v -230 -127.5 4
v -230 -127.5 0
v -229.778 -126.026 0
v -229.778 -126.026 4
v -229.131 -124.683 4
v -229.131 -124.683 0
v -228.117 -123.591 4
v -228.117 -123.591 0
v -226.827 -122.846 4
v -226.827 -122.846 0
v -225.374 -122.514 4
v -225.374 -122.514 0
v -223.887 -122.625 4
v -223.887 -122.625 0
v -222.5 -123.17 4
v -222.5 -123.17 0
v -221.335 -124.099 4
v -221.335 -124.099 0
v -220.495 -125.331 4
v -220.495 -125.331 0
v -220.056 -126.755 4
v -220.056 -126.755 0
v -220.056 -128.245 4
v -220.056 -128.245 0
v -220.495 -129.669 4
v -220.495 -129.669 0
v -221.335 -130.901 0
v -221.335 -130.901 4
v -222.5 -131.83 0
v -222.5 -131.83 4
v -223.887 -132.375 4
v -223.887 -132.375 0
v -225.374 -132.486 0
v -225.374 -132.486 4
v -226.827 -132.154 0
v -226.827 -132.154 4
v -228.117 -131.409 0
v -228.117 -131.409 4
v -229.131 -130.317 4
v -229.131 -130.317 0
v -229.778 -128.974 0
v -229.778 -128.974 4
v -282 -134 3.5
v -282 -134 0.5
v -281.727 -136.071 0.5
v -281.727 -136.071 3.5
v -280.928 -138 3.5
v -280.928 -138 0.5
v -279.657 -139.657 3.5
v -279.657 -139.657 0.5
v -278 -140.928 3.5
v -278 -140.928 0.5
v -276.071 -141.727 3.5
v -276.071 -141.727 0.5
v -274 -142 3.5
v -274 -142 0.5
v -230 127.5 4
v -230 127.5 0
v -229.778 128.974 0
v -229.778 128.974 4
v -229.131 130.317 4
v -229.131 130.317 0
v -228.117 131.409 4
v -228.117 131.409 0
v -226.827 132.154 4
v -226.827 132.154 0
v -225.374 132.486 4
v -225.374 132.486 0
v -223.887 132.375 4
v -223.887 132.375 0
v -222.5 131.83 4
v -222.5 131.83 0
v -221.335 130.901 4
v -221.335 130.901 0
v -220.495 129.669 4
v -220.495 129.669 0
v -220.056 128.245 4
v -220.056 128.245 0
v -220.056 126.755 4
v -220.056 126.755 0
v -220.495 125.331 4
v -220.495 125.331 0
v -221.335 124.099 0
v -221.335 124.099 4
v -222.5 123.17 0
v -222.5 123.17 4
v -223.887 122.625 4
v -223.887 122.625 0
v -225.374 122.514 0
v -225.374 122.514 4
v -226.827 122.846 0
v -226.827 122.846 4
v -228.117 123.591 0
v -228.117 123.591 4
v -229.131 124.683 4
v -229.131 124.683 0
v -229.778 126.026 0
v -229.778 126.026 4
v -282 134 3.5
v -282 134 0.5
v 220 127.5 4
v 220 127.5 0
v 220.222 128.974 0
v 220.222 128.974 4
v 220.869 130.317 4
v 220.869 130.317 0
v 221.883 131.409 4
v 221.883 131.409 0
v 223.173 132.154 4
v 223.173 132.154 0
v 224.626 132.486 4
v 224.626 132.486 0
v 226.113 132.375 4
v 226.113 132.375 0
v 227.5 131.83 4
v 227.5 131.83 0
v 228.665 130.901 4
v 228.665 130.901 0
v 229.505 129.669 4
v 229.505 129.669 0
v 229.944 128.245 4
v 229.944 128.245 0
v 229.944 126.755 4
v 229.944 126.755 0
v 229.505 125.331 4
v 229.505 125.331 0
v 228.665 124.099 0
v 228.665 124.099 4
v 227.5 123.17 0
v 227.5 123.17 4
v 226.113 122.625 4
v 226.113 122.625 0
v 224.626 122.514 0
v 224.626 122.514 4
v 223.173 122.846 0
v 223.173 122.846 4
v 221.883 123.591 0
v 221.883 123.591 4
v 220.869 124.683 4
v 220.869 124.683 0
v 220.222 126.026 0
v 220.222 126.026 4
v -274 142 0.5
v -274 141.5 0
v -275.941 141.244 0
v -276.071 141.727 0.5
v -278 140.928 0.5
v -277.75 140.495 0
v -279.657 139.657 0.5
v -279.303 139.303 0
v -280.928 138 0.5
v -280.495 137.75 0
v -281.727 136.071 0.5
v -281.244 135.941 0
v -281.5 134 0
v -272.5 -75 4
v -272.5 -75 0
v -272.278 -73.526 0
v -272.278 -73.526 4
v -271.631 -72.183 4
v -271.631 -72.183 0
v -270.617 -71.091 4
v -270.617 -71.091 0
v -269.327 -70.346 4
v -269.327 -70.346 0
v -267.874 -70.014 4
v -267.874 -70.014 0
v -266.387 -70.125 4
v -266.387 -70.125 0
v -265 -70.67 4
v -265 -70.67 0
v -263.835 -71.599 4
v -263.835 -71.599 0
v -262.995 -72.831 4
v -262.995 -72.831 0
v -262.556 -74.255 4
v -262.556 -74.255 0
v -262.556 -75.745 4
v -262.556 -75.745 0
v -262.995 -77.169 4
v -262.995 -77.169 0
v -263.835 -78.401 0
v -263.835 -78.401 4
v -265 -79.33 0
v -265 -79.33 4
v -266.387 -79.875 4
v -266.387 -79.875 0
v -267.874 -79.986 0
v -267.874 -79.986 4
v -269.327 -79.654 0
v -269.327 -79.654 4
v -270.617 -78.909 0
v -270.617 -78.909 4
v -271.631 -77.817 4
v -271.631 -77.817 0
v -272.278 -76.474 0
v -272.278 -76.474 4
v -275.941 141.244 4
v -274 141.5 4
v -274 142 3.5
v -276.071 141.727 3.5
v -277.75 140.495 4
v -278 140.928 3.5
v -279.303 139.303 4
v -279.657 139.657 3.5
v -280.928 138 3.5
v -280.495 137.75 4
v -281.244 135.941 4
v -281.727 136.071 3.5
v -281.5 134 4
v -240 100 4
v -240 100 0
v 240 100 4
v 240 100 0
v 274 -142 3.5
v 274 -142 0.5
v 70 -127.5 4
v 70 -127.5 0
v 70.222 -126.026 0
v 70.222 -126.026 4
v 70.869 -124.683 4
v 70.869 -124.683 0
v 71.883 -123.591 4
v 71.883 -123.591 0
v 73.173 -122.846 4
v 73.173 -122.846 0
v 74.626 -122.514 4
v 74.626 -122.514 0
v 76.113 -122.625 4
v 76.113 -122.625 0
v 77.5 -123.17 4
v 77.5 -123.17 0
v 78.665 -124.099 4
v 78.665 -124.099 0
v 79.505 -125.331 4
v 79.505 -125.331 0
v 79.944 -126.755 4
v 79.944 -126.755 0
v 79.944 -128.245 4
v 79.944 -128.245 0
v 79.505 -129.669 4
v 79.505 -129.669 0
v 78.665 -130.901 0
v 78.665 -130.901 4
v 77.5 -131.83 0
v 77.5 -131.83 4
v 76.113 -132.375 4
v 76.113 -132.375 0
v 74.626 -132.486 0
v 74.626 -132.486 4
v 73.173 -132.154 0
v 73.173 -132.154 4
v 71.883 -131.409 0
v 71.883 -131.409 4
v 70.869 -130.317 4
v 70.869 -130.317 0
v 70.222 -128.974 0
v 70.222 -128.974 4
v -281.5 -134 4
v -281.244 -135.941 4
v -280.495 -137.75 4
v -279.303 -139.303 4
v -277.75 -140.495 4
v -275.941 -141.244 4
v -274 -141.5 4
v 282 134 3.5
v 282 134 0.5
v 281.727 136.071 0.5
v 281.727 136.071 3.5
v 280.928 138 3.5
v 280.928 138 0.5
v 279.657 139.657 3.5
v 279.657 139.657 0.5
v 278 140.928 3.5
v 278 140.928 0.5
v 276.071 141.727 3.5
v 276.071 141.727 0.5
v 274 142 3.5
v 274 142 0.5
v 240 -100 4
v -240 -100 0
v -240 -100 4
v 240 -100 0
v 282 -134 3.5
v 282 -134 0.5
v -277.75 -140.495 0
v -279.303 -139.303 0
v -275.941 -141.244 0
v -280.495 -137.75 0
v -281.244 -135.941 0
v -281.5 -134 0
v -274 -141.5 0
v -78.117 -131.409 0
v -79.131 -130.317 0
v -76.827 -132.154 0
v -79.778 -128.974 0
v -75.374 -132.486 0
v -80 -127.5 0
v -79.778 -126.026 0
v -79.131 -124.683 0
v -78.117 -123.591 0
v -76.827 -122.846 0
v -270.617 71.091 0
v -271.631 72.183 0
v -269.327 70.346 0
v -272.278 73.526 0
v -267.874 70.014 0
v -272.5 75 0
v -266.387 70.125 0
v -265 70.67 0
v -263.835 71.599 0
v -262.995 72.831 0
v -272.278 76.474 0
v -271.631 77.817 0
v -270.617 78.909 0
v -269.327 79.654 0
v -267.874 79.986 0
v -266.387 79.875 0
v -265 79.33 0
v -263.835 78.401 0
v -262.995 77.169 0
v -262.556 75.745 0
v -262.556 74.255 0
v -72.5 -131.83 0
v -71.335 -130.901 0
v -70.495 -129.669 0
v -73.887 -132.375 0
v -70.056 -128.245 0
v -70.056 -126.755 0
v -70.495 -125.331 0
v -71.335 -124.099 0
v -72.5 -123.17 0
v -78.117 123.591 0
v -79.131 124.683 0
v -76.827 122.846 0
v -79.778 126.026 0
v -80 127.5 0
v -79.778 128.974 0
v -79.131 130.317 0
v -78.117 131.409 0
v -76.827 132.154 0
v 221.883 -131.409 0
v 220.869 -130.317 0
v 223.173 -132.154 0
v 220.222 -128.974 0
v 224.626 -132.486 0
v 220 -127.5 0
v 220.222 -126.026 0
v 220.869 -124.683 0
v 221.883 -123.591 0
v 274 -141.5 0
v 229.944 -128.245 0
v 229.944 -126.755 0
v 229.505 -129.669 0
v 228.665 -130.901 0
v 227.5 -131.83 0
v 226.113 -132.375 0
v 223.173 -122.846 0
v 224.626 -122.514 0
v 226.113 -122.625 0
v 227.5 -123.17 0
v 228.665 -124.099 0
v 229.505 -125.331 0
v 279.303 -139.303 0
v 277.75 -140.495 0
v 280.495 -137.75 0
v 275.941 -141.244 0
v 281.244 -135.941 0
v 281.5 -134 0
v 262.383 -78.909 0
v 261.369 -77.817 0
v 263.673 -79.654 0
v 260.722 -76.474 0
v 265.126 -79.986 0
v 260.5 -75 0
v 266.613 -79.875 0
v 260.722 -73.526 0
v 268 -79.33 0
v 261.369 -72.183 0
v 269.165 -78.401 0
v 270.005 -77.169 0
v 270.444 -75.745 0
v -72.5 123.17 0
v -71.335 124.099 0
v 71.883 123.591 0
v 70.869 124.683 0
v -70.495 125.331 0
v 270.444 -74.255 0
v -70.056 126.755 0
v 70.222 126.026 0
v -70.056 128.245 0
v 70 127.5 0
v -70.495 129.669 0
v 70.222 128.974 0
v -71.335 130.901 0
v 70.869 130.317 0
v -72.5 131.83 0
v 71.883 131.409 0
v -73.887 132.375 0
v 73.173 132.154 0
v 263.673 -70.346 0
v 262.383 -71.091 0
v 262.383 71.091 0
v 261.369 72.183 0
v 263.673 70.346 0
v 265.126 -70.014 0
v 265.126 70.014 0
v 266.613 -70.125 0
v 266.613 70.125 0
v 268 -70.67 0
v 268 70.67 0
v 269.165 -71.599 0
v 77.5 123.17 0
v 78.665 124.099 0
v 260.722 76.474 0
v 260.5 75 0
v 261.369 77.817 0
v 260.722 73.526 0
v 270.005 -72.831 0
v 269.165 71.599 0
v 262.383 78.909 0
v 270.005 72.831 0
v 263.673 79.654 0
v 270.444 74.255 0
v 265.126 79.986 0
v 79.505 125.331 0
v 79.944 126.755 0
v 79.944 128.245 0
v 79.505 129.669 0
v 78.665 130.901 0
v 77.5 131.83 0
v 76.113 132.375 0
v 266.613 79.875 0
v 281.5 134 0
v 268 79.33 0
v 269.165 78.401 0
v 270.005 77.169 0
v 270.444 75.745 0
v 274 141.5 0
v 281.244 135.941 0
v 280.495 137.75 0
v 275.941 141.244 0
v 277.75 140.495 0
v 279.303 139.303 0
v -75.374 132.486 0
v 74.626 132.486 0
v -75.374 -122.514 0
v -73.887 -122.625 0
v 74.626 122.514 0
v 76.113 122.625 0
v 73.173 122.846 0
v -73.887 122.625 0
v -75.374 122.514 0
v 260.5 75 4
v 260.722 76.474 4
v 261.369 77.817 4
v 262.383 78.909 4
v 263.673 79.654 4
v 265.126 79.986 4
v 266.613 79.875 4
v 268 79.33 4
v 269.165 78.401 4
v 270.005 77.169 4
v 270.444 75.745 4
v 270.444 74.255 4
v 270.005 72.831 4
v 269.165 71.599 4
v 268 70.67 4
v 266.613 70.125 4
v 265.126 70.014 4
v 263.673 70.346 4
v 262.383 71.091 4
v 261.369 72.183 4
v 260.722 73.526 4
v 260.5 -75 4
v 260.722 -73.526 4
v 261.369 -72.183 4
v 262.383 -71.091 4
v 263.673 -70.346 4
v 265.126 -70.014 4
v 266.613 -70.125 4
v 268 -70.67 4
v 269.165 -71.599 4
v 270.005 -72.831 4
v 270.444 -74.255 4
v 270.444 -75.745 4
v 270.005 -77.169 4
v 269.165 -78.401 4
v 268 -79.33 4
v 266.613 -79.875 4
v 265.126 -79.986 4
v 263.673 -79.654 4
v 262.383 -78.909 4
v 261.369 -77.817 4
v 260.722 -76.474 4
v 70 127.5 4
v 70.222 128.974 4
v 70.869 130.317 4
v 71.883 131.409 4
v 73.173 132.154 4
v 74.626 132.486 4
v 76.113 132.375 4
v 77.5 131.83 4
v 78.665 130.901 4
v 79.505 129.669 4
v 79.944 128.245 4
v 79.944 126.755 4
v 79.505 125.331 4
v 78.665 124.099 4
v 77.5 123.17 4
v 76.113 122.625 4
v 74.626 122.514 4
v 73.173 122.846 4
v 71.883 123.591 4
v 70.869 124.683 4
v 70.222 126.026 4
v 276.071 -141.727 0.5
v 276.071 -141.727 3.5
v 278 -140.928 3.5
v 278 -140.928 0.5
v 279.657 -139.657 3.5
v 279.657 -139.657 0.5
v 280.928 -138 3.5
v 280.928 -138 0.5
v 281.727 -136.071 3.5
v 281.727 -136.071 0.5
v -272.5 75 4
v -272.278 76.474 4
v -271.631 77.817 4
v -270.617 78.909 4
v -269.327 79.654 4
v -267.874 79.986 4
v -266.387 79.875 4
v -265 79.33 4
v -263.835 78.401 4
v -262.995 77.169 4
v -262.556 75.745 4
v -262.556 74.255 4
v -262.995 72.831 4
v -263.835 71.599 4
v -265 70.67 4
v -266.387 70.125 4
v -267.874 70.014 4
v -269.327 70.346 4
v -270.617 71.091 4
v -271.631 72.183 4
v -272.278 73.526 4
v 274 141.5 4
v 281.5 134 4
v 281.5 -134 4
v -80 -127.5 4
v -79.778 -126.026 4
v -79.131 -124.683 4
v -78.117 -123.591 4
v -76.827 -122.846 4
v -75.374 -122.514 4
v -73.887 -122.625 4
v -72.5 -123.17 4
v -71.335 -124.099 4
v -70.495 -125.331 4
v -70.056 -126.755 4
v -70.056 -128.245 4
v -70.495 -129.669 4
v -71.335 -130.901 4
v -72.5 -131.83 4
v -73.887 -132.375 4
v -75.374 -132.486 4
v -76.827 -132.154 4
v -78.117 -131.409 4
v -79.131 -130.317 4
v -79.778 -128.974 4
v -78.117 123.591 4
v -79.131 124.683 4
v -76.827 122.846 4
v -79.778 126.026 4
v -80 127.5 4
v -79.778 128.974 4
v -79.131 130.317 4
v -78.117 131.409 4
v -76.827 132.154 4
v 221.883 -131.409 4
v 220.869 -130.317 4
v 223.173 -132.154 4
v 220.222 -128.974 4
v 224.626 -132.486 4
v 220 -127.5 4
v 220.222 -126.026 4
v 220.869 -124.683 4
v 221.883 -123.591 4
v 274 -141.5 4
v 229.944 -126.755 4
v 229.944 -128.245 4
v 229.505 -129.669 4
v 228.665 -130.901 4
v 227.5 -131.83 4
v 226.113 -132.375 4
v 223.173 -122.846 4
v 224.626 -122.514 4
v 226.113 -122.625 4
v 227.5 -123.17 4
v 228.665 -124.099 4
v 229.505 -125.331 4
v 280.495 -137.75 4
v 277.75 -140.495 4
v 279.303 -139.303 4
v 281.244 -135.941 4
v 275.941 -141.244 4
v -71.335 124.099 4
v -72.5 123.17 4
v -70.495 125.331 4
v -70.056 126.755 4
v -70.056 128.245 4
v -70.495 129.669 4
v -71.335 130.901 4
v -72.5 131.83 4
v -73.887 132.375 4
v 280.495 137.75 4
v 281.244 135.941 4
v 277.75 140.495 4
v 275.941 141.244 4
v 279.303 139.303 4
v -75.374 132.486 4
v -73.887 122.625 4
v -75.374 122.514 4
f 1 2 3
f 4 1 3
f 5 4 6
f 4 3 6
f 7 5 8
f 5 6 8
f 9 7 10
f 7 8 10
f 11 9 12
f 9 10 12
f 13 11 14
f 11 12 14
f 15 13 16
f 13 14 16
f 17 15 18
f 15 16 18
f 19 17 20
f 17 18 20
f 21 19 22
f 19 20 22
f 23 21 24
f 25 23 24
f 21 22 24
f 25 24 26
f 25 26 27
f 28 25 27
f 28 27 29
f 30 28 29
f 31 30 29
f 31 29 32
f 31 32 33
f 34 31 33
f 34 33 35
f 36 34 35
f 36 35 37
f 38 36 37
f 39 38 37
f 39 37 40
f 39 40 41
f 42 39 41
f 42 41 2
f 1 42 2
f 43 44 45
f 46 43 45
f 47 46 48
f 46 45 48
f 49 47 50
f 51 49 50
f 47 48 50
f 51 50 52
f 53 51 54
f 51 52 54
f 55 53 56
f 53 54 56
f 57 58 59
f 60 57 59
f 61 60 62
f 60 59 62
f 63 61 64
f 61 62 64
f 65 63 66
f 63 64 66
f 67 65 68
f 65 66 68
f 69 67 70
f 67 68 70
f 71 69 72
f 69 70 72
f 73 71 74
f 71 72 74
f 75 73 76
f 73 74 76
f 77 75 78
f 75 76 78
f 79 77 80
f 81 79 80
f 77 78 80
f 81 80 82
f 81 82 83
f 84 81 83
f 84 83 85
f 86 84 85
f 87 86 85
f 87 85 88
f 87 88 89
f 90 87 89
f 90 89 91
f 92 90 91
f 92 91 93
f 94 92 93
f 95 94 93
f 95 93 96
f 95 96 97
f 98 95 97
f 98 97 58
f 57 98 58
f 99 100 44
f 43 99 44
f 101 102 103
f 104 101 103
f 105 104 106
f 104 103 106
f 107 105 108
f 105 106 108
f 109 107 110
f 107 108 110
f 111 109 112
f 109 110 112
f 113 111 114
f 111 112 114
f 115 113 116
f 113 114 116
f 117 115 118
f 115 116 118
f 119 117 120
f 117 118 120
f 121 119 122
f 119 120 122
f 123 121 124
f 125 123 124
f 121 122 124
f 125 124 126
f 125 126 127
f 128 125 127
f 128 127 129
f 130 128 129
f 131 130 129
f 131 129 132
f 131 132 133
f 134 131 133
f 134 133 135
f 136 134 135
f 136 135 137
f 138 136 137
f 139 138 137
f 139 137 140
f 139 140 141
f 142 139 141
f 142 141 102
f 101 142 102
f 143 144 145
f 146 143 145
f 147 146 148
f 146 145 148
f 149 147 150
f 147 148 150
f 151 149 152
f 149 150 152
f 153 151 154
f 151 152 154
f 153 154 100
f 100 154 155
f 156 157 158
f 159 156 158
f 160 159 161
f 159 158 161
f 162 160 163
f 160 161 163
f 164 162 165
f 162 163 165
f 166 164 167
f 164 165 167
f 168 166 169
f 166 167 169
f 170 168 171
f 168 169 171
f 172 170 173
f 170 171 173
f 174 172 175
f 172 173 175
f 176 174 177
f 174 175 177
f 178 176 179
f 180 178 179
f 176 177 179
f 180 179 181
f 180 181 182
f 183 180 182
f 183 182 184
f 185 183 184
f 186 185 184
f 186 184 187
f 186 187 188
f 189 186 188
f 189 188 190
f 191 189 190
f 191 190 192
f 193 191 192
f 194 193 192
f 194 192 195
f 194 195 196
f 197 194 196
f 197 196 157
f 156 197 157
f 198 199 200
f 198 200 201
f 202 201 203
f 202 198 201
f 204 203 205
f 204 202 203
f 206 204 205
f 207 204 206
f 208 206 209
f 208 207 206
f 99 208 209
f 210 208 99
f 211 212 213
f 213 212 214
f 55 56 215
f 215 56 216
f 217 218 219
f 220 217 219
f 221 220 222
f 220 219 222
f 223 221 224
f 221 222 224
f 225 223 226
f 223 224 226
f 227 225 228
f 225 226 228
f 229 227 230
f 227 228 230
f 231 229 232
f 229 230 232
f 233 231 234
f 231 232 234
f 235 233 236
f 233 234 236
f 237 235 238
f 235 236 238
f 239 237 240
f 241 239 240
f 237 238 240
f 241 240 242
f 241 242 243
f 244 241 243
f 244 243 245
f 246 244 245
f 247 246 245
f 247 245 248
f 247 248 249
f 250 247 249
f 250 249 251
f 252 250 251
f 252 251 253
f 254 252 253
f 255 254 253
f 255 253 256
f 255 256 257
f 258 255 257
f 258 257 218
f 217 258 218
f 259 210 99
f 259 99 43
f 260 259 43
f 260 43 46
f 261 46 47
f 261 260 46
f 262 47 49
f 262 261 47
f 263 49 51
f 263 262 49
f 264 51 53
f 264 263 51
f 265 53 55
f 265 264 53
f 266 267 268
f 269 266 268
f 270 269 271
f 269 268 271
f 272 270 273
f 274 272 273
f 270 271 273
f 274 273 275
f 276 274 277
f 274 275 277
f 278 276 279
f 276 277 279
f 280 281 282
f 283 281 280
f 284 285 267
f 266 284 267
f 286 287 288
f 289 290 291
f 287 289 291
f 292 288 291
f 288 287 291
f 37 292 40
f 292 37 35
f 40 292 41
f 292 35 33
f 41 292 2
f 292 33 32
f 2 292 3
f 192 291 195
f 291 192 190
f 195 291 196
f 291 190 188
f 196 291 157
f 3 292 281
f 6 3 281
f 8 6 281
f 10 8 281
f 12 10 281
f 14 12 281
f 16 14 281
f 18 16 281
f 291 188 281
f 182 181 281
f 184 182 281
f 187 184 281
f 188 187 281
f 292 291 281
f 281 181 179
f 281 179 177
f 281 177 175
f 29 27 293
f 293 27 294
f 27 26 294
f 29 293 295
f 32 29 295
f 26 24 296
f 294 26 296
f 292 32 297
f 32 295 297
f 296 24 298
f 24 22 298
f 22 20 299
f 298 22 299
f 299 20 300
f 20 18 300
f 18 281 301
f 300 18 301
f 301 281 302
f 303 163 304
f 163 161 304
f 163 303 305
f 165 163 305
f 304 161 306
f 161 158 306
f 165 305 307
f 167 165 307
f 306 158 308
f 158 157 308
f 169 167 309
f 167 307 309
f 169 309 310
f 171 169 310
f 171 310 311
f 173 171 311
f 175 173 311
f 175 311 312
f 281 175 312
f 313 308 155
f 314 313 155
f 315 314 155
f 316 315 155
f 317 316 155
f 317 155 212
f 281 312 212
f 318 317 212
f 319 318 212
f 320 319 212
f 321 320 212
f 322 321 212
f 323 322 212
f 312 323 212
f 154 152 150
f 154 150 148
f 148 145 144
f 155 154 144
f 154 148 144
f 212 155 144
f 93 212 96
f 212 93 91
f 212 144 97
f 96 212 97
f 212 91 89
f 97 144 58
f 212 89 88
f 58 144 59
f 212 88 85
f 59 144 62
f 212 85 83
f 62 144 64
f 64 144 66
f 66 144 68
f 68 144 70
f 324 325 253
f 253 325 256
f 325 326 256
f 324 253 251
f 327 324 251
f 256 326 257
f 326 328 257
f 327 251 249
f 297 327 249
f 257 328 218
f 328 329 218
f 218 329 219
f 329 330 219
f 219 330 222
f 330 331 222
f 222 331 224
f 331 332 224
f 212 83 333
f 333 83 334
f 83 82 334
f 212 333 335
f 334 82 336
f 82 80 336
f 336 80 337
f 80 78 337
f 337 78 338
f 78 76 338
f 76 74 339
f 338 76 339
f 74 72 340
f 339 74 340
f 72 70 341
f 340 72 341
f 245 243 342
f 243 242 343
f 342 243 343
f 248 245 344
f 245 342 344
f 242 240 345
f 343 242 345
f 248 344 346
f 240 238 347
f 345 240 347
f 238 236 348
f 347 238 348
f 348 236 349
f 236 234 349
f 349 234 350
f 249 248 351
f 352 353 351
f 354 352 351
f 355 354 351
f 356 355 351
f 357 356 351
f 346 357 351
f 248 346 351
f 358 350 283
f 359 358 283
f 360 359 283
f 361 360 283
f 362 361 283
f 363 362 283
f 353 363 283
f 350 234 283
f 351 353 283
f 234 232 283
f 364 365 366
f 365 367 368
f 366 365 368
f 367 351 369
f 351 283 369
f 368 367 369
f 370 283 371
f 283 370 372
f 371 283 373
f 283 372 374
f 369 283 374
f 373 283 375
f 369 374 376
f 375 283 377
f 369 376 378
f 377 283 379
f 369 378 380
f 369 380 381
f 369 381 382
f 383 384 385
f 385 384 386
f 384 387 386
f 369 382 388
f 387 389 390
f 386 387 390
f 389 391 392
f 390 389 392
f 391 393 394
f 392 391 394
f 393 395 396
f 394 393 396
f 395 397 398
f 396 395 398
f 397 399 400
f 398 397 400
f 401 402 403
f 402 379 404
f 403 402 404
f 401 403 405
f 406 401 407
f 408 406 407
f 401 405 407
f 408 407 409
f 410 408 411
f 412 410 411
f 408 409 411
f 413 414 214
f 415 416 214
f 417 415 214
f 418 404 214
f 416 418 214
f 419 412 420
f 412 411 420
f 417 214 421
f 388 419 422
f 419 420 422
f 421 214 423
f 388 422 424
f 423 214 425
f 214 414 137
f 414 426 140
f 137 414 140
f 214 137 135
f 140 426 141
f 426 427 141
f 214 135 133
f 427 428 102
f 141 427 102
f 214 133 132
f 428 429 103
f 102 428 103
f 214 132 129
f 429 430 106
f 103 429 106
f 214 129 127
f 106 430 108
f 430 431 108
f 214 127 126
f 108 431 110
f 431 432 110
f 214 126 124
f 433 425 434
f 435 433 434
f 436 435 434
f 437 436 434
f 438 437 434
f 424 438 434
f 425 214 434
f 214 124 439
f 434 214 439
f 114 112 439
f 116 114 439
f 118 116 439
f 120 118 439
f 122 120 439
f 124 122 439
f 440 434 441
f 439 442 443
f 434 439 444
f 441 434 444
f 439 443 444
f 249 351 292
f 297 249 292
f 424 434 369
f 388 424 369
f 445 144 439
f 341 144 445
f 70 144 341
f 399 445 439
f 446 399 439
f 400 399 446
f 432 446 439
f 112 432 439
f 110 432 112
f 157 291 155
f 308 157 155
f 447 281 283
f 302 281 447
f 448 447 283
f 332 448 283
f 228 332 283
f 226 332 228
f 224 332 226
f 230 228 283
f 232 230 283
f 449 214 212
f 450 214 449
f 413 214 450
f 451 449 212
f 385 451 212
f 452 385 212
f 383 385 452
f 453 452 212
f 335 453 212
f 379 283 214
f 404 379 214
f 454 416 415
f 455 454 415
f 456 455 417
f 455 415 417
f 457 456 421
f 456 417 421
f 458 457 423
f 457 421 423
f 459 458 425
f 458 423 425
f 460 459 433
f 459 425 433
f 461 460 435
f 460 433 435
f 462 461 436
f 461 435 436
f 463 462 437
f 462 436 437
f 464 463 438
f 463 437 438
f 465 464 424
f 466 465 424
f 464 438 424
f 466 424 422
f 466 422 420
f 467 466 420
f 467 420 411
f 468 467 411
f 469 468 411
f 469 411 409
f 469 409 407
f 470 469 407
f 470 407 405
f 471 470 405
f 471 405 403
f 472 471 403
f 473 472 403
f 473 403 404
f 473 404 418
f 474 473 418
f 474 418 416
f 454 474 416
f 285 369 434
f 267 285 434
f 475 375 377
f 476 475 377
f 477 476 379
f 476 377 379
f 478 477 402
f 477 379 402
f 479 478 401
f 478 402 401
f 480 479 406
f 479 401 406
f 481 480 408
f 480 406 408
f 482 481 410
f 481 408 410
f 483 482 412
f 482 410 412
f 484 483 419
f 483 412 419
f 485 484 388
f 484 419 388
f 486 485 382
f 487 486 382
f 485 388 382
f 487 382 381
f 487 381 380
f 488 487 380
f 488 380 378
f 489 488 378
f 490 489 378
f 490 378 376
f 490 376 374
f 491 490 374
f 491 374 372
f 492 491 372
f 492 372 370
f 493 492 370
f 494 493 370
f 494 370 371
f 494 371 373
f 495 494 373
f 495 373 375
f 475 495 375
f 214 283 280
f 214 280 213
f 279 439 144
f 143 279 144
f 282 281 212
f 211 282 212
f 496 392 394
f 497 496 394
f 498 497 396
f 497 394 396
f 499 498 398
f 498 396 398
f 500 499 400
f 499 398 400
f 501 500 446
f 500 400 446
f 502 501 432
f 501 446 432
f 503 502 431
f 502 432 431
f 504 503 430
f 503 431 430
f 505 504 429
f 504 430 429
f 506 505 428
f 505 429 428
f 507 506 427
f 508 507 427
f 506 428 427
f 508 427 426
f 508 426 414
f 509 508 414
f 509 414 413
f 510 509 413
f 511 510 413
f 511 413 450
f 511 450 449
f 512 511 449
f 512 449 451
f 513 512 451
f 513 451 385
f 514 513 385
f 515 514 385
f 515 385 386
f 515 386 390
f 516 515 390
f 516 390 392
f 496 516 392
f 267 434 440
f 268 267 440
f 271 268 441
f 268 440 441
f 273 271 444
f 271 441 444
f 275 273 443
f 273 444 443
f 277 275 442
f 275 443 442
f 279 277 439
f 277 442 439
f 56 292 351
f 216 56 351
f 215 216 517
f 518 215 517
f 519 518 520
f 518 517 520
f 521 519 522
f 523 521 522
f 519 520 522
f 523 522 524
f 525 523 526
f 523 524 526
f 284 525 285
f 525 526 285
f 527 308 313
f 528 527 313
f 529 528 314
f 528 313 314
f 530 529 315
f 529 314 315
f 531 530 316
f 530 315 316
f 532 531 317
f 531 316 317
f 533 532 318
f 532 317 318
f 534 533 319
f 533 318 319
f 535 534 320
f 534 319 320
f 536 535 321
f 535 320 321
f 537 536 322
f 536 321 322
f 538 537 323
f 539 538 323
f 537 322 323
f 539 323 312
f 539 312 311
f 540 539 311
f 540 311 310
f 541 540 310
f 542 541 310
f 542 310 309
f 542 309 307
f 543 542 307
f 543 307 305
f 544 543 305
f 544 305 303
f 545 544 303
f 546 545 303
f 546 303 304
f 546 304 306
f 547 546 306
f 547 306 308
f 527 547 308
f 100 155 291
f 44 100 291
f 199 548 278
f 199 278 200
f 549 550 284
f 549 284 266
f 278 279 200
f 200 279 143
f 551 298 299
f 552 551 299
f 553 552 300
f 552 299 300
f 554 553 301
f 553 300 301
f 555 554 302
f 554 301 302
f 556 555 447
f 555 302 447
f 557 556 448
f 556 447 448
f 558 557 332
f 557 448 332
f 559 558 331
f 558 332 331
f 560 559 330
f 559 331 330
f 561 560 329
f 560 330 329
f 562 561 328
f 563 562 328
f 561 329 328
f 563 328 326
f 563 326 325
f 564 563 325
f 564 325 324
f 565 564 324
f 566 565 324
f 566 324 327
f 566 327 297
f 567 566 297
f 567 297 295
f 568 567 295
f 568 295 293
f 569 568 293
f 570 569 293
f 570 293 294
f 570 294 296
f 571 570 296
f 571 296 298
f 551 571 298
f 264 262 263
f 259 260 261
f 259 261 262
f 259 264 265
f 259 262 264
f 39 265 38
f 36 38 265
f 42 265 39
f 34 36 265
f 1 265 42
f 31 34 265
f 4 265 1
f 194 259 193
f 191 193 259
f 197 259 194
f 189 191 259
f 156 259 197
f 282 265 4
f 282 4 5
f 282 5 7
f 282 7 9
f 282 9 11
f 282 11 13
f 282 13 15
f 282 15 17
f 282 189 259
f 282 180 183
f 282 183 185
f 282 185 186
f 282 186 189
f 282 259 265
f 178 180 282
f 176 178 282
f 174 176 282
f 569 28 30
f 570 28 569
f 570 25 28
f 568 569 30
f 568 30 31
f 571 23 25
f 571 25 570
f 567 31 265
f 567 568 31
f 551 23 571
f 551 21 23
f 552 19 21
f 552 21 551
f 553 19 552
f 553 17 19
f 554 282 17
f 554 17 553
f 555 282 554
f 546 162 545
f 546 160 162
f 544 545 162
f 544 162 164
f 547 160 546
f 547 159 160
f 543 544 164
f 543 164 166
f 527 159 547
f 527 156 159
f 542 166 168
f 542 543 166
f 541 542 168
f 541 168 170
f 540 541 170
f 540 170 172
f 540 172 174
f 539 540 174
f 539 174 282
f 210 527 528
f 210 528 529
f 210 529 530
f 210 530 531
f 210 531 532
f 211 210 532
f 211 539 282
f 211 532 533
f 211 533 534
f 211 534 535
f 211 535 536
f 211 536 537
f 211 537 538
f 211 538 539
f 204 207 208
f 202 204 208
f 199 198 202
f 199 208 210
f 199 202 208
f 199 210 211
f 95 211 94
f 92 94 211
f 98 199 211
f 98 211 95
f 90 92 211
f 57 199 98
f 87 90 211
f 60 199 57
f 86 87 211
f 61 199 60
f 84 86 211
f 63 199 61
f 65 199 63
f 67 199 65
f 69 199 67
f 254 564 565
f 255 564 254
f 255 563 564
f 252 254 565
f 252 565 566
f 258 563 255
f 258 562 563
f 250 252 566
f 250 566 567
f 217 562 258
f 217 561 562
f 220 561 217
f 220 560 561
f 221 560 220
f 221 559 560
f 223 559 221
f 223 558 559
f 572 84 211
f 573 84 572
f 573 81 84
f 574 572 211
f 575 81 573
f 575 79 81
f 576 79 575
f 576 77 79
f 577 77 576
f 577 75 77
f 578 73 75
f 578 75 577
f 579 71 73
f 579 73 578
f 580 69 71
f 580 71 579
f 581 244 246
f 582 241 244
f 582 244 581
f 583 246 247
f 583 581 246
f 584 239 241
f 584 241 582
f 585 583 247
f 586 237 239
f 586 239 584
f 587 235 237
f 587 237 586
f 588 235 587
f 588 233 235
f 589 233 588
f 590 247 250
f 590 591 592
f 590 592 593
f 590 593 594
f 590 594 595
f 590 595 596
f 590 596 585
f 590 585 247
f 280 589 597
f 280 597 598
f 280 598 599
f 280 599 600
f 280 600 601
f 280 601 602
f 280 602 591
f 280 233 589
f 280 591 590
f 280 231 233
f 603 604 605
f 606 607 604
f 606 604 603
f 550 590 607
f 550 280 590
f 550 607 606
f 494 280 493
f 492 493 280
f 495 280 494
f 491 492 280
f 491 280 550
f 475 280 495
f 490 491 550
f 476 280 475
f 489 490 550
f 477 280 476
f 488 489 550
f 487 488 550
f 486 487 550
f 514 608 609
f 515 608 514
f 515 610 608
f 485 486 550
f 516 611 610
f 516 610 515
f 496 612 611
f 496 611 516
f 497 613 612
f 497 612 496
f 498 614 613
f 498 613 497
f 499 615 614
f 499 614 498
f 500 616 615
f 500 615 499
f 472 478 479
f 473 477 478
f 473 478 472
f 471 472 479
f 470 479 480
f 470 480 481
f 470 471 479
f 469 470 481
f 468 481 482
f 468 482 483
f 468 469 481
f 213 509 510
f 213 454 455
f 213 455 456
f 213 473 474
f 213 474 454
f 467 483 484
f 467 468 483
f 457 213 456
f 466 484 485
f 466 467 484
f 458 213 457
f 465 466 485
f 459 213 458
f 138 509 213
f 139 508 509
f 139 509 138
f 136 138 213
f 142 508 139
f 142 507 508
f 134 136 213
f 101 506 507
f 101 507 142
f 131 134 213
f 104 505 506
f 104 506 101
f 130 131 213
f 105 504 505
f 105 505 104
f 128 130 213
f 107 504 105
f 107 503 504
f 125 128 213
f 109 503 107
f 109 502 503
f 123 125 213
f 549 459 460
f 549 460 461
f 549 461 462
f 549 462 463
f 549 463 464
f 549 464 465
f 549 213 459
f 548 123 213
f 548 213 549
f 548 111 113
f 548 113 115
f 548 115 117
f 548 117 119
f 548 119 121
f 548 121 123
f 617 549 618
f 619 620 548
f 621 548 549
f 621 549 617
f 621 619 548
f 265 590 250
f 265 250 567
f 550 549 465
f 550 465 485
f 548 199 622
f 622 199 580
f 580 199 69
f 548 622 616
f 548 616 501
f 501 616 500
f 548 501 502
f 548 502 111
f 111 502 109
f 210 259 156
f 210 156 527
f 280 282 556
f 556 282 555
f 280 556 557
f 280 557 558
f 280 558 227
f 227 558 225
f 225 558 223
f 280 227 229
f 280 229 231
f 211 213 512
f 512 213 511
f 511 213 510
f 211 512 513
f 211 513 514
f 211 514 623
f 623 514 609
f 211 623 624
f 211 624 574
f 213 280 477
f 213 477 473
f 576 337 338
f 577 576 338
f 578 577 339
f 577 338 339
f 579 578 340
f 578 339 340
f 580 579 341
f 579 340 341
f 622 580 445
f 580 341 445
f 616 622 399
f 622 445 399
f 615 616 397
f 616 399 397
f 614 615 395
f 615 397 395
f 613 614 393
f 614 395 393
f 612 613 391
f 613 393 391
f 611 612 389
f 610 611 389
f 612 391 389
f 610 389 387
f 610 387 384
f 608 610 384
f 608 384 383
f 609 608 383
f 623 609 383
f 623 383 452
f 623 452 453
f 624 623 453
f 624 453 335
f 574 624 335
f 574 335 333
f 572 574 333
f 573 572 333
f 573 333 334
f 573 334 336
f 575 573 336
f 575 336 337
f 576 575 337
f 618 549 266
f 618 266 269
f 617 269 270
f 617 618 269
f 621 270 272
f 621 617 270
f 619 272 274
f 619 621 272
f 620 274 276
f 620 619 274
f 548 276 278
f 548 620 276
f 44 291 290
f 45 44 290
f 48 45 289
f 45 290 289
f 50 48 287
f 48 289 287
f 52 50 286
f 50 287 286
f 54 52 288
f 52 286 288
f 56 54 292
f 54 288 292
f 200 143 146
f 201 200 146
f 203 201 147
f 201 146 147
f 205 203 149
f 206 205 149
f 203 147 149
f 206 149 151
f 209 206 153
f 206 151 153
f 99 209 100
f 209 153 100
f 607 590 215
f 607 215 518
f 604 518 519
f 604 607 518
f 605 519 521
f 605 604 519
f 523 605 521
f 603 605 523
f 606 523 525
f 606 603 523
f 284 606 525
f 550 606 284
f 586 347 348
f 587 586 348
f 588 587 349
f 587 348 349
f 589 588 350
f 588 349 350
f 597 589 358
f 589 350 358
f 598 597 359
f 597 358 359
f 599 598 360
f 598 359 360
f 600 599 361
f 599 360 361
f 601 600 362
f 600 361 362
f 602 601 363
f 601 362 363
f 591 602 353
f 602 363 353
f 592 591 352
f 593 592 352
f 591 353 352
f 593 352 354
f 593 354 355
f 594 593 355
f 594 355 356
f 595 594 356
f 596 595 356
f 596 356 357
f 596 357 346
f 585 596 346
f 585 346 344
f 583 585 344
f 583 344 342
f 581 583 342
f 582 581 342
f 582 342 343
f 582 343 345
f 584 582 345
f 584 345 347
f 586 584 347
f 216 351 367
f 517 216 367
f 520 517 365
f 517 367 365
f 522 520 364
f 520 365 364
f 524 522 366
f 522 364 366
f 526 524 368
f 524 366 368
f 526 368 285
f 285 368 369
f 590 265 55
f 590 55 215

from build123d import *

# Parameters (mm, degrees)
F0_W     = 480
F0_H     = 200
F1_DEPTH = 4
F3_D     = 10
F4_SIZE  = 0.5


with BuildPart() as f1:
    # F0 (on Top) → F1 (new body)
    with BuildSketch(Plane.XY):
        with BuildLine():
            Line((-274, -142), (274, -142))
            ThreePointArc((274, -142), (279.656854, -139.656854), (282, -134))
            Line((282, -134), (282, 134))
            ThreePointArc((282, 134), (279.656854, 139.656854), (274, 142))
            Line((274, 142), (-274, 142))
            ThreePointArc((-274, 142), (-279.656854, 139.656854), (-282, 134))
            Line((-282, 134), (-282, -134))
            ThreePointArc((-282, -134), (-279.656854, -139.656854), (-274, -142))
        make_face()
        Rectangle(F0_W, F0_H, mode=Mode.SUBTRACT)
    extrude(amount=F1_DEPTH)

    # F3 (through all)
    with Locations(Plane.XY.offset(4)):
        with Locations((-225, 127.5), (-75, 127.5), (75, 127.5), (225, 127.5), (265.5, 75), (265.5, -75), (225, -127.5), (75, -127.5), (-75, -127.5), (-225, -127.5), (-267.5, 75), (-267.5, -75)):
            Hole(F3_D / 2)

    # F4
    f4_edges = [f1.edges().sort_by_distance(p)[0] for p in [
        (0, -142, 4),
        (-274, -142, 2),
        (274, -142, 2),
        (0, -142, 0),
    ]]
    chamfer(f4_edges, length=F4_SIZE)


solid = f1.part
